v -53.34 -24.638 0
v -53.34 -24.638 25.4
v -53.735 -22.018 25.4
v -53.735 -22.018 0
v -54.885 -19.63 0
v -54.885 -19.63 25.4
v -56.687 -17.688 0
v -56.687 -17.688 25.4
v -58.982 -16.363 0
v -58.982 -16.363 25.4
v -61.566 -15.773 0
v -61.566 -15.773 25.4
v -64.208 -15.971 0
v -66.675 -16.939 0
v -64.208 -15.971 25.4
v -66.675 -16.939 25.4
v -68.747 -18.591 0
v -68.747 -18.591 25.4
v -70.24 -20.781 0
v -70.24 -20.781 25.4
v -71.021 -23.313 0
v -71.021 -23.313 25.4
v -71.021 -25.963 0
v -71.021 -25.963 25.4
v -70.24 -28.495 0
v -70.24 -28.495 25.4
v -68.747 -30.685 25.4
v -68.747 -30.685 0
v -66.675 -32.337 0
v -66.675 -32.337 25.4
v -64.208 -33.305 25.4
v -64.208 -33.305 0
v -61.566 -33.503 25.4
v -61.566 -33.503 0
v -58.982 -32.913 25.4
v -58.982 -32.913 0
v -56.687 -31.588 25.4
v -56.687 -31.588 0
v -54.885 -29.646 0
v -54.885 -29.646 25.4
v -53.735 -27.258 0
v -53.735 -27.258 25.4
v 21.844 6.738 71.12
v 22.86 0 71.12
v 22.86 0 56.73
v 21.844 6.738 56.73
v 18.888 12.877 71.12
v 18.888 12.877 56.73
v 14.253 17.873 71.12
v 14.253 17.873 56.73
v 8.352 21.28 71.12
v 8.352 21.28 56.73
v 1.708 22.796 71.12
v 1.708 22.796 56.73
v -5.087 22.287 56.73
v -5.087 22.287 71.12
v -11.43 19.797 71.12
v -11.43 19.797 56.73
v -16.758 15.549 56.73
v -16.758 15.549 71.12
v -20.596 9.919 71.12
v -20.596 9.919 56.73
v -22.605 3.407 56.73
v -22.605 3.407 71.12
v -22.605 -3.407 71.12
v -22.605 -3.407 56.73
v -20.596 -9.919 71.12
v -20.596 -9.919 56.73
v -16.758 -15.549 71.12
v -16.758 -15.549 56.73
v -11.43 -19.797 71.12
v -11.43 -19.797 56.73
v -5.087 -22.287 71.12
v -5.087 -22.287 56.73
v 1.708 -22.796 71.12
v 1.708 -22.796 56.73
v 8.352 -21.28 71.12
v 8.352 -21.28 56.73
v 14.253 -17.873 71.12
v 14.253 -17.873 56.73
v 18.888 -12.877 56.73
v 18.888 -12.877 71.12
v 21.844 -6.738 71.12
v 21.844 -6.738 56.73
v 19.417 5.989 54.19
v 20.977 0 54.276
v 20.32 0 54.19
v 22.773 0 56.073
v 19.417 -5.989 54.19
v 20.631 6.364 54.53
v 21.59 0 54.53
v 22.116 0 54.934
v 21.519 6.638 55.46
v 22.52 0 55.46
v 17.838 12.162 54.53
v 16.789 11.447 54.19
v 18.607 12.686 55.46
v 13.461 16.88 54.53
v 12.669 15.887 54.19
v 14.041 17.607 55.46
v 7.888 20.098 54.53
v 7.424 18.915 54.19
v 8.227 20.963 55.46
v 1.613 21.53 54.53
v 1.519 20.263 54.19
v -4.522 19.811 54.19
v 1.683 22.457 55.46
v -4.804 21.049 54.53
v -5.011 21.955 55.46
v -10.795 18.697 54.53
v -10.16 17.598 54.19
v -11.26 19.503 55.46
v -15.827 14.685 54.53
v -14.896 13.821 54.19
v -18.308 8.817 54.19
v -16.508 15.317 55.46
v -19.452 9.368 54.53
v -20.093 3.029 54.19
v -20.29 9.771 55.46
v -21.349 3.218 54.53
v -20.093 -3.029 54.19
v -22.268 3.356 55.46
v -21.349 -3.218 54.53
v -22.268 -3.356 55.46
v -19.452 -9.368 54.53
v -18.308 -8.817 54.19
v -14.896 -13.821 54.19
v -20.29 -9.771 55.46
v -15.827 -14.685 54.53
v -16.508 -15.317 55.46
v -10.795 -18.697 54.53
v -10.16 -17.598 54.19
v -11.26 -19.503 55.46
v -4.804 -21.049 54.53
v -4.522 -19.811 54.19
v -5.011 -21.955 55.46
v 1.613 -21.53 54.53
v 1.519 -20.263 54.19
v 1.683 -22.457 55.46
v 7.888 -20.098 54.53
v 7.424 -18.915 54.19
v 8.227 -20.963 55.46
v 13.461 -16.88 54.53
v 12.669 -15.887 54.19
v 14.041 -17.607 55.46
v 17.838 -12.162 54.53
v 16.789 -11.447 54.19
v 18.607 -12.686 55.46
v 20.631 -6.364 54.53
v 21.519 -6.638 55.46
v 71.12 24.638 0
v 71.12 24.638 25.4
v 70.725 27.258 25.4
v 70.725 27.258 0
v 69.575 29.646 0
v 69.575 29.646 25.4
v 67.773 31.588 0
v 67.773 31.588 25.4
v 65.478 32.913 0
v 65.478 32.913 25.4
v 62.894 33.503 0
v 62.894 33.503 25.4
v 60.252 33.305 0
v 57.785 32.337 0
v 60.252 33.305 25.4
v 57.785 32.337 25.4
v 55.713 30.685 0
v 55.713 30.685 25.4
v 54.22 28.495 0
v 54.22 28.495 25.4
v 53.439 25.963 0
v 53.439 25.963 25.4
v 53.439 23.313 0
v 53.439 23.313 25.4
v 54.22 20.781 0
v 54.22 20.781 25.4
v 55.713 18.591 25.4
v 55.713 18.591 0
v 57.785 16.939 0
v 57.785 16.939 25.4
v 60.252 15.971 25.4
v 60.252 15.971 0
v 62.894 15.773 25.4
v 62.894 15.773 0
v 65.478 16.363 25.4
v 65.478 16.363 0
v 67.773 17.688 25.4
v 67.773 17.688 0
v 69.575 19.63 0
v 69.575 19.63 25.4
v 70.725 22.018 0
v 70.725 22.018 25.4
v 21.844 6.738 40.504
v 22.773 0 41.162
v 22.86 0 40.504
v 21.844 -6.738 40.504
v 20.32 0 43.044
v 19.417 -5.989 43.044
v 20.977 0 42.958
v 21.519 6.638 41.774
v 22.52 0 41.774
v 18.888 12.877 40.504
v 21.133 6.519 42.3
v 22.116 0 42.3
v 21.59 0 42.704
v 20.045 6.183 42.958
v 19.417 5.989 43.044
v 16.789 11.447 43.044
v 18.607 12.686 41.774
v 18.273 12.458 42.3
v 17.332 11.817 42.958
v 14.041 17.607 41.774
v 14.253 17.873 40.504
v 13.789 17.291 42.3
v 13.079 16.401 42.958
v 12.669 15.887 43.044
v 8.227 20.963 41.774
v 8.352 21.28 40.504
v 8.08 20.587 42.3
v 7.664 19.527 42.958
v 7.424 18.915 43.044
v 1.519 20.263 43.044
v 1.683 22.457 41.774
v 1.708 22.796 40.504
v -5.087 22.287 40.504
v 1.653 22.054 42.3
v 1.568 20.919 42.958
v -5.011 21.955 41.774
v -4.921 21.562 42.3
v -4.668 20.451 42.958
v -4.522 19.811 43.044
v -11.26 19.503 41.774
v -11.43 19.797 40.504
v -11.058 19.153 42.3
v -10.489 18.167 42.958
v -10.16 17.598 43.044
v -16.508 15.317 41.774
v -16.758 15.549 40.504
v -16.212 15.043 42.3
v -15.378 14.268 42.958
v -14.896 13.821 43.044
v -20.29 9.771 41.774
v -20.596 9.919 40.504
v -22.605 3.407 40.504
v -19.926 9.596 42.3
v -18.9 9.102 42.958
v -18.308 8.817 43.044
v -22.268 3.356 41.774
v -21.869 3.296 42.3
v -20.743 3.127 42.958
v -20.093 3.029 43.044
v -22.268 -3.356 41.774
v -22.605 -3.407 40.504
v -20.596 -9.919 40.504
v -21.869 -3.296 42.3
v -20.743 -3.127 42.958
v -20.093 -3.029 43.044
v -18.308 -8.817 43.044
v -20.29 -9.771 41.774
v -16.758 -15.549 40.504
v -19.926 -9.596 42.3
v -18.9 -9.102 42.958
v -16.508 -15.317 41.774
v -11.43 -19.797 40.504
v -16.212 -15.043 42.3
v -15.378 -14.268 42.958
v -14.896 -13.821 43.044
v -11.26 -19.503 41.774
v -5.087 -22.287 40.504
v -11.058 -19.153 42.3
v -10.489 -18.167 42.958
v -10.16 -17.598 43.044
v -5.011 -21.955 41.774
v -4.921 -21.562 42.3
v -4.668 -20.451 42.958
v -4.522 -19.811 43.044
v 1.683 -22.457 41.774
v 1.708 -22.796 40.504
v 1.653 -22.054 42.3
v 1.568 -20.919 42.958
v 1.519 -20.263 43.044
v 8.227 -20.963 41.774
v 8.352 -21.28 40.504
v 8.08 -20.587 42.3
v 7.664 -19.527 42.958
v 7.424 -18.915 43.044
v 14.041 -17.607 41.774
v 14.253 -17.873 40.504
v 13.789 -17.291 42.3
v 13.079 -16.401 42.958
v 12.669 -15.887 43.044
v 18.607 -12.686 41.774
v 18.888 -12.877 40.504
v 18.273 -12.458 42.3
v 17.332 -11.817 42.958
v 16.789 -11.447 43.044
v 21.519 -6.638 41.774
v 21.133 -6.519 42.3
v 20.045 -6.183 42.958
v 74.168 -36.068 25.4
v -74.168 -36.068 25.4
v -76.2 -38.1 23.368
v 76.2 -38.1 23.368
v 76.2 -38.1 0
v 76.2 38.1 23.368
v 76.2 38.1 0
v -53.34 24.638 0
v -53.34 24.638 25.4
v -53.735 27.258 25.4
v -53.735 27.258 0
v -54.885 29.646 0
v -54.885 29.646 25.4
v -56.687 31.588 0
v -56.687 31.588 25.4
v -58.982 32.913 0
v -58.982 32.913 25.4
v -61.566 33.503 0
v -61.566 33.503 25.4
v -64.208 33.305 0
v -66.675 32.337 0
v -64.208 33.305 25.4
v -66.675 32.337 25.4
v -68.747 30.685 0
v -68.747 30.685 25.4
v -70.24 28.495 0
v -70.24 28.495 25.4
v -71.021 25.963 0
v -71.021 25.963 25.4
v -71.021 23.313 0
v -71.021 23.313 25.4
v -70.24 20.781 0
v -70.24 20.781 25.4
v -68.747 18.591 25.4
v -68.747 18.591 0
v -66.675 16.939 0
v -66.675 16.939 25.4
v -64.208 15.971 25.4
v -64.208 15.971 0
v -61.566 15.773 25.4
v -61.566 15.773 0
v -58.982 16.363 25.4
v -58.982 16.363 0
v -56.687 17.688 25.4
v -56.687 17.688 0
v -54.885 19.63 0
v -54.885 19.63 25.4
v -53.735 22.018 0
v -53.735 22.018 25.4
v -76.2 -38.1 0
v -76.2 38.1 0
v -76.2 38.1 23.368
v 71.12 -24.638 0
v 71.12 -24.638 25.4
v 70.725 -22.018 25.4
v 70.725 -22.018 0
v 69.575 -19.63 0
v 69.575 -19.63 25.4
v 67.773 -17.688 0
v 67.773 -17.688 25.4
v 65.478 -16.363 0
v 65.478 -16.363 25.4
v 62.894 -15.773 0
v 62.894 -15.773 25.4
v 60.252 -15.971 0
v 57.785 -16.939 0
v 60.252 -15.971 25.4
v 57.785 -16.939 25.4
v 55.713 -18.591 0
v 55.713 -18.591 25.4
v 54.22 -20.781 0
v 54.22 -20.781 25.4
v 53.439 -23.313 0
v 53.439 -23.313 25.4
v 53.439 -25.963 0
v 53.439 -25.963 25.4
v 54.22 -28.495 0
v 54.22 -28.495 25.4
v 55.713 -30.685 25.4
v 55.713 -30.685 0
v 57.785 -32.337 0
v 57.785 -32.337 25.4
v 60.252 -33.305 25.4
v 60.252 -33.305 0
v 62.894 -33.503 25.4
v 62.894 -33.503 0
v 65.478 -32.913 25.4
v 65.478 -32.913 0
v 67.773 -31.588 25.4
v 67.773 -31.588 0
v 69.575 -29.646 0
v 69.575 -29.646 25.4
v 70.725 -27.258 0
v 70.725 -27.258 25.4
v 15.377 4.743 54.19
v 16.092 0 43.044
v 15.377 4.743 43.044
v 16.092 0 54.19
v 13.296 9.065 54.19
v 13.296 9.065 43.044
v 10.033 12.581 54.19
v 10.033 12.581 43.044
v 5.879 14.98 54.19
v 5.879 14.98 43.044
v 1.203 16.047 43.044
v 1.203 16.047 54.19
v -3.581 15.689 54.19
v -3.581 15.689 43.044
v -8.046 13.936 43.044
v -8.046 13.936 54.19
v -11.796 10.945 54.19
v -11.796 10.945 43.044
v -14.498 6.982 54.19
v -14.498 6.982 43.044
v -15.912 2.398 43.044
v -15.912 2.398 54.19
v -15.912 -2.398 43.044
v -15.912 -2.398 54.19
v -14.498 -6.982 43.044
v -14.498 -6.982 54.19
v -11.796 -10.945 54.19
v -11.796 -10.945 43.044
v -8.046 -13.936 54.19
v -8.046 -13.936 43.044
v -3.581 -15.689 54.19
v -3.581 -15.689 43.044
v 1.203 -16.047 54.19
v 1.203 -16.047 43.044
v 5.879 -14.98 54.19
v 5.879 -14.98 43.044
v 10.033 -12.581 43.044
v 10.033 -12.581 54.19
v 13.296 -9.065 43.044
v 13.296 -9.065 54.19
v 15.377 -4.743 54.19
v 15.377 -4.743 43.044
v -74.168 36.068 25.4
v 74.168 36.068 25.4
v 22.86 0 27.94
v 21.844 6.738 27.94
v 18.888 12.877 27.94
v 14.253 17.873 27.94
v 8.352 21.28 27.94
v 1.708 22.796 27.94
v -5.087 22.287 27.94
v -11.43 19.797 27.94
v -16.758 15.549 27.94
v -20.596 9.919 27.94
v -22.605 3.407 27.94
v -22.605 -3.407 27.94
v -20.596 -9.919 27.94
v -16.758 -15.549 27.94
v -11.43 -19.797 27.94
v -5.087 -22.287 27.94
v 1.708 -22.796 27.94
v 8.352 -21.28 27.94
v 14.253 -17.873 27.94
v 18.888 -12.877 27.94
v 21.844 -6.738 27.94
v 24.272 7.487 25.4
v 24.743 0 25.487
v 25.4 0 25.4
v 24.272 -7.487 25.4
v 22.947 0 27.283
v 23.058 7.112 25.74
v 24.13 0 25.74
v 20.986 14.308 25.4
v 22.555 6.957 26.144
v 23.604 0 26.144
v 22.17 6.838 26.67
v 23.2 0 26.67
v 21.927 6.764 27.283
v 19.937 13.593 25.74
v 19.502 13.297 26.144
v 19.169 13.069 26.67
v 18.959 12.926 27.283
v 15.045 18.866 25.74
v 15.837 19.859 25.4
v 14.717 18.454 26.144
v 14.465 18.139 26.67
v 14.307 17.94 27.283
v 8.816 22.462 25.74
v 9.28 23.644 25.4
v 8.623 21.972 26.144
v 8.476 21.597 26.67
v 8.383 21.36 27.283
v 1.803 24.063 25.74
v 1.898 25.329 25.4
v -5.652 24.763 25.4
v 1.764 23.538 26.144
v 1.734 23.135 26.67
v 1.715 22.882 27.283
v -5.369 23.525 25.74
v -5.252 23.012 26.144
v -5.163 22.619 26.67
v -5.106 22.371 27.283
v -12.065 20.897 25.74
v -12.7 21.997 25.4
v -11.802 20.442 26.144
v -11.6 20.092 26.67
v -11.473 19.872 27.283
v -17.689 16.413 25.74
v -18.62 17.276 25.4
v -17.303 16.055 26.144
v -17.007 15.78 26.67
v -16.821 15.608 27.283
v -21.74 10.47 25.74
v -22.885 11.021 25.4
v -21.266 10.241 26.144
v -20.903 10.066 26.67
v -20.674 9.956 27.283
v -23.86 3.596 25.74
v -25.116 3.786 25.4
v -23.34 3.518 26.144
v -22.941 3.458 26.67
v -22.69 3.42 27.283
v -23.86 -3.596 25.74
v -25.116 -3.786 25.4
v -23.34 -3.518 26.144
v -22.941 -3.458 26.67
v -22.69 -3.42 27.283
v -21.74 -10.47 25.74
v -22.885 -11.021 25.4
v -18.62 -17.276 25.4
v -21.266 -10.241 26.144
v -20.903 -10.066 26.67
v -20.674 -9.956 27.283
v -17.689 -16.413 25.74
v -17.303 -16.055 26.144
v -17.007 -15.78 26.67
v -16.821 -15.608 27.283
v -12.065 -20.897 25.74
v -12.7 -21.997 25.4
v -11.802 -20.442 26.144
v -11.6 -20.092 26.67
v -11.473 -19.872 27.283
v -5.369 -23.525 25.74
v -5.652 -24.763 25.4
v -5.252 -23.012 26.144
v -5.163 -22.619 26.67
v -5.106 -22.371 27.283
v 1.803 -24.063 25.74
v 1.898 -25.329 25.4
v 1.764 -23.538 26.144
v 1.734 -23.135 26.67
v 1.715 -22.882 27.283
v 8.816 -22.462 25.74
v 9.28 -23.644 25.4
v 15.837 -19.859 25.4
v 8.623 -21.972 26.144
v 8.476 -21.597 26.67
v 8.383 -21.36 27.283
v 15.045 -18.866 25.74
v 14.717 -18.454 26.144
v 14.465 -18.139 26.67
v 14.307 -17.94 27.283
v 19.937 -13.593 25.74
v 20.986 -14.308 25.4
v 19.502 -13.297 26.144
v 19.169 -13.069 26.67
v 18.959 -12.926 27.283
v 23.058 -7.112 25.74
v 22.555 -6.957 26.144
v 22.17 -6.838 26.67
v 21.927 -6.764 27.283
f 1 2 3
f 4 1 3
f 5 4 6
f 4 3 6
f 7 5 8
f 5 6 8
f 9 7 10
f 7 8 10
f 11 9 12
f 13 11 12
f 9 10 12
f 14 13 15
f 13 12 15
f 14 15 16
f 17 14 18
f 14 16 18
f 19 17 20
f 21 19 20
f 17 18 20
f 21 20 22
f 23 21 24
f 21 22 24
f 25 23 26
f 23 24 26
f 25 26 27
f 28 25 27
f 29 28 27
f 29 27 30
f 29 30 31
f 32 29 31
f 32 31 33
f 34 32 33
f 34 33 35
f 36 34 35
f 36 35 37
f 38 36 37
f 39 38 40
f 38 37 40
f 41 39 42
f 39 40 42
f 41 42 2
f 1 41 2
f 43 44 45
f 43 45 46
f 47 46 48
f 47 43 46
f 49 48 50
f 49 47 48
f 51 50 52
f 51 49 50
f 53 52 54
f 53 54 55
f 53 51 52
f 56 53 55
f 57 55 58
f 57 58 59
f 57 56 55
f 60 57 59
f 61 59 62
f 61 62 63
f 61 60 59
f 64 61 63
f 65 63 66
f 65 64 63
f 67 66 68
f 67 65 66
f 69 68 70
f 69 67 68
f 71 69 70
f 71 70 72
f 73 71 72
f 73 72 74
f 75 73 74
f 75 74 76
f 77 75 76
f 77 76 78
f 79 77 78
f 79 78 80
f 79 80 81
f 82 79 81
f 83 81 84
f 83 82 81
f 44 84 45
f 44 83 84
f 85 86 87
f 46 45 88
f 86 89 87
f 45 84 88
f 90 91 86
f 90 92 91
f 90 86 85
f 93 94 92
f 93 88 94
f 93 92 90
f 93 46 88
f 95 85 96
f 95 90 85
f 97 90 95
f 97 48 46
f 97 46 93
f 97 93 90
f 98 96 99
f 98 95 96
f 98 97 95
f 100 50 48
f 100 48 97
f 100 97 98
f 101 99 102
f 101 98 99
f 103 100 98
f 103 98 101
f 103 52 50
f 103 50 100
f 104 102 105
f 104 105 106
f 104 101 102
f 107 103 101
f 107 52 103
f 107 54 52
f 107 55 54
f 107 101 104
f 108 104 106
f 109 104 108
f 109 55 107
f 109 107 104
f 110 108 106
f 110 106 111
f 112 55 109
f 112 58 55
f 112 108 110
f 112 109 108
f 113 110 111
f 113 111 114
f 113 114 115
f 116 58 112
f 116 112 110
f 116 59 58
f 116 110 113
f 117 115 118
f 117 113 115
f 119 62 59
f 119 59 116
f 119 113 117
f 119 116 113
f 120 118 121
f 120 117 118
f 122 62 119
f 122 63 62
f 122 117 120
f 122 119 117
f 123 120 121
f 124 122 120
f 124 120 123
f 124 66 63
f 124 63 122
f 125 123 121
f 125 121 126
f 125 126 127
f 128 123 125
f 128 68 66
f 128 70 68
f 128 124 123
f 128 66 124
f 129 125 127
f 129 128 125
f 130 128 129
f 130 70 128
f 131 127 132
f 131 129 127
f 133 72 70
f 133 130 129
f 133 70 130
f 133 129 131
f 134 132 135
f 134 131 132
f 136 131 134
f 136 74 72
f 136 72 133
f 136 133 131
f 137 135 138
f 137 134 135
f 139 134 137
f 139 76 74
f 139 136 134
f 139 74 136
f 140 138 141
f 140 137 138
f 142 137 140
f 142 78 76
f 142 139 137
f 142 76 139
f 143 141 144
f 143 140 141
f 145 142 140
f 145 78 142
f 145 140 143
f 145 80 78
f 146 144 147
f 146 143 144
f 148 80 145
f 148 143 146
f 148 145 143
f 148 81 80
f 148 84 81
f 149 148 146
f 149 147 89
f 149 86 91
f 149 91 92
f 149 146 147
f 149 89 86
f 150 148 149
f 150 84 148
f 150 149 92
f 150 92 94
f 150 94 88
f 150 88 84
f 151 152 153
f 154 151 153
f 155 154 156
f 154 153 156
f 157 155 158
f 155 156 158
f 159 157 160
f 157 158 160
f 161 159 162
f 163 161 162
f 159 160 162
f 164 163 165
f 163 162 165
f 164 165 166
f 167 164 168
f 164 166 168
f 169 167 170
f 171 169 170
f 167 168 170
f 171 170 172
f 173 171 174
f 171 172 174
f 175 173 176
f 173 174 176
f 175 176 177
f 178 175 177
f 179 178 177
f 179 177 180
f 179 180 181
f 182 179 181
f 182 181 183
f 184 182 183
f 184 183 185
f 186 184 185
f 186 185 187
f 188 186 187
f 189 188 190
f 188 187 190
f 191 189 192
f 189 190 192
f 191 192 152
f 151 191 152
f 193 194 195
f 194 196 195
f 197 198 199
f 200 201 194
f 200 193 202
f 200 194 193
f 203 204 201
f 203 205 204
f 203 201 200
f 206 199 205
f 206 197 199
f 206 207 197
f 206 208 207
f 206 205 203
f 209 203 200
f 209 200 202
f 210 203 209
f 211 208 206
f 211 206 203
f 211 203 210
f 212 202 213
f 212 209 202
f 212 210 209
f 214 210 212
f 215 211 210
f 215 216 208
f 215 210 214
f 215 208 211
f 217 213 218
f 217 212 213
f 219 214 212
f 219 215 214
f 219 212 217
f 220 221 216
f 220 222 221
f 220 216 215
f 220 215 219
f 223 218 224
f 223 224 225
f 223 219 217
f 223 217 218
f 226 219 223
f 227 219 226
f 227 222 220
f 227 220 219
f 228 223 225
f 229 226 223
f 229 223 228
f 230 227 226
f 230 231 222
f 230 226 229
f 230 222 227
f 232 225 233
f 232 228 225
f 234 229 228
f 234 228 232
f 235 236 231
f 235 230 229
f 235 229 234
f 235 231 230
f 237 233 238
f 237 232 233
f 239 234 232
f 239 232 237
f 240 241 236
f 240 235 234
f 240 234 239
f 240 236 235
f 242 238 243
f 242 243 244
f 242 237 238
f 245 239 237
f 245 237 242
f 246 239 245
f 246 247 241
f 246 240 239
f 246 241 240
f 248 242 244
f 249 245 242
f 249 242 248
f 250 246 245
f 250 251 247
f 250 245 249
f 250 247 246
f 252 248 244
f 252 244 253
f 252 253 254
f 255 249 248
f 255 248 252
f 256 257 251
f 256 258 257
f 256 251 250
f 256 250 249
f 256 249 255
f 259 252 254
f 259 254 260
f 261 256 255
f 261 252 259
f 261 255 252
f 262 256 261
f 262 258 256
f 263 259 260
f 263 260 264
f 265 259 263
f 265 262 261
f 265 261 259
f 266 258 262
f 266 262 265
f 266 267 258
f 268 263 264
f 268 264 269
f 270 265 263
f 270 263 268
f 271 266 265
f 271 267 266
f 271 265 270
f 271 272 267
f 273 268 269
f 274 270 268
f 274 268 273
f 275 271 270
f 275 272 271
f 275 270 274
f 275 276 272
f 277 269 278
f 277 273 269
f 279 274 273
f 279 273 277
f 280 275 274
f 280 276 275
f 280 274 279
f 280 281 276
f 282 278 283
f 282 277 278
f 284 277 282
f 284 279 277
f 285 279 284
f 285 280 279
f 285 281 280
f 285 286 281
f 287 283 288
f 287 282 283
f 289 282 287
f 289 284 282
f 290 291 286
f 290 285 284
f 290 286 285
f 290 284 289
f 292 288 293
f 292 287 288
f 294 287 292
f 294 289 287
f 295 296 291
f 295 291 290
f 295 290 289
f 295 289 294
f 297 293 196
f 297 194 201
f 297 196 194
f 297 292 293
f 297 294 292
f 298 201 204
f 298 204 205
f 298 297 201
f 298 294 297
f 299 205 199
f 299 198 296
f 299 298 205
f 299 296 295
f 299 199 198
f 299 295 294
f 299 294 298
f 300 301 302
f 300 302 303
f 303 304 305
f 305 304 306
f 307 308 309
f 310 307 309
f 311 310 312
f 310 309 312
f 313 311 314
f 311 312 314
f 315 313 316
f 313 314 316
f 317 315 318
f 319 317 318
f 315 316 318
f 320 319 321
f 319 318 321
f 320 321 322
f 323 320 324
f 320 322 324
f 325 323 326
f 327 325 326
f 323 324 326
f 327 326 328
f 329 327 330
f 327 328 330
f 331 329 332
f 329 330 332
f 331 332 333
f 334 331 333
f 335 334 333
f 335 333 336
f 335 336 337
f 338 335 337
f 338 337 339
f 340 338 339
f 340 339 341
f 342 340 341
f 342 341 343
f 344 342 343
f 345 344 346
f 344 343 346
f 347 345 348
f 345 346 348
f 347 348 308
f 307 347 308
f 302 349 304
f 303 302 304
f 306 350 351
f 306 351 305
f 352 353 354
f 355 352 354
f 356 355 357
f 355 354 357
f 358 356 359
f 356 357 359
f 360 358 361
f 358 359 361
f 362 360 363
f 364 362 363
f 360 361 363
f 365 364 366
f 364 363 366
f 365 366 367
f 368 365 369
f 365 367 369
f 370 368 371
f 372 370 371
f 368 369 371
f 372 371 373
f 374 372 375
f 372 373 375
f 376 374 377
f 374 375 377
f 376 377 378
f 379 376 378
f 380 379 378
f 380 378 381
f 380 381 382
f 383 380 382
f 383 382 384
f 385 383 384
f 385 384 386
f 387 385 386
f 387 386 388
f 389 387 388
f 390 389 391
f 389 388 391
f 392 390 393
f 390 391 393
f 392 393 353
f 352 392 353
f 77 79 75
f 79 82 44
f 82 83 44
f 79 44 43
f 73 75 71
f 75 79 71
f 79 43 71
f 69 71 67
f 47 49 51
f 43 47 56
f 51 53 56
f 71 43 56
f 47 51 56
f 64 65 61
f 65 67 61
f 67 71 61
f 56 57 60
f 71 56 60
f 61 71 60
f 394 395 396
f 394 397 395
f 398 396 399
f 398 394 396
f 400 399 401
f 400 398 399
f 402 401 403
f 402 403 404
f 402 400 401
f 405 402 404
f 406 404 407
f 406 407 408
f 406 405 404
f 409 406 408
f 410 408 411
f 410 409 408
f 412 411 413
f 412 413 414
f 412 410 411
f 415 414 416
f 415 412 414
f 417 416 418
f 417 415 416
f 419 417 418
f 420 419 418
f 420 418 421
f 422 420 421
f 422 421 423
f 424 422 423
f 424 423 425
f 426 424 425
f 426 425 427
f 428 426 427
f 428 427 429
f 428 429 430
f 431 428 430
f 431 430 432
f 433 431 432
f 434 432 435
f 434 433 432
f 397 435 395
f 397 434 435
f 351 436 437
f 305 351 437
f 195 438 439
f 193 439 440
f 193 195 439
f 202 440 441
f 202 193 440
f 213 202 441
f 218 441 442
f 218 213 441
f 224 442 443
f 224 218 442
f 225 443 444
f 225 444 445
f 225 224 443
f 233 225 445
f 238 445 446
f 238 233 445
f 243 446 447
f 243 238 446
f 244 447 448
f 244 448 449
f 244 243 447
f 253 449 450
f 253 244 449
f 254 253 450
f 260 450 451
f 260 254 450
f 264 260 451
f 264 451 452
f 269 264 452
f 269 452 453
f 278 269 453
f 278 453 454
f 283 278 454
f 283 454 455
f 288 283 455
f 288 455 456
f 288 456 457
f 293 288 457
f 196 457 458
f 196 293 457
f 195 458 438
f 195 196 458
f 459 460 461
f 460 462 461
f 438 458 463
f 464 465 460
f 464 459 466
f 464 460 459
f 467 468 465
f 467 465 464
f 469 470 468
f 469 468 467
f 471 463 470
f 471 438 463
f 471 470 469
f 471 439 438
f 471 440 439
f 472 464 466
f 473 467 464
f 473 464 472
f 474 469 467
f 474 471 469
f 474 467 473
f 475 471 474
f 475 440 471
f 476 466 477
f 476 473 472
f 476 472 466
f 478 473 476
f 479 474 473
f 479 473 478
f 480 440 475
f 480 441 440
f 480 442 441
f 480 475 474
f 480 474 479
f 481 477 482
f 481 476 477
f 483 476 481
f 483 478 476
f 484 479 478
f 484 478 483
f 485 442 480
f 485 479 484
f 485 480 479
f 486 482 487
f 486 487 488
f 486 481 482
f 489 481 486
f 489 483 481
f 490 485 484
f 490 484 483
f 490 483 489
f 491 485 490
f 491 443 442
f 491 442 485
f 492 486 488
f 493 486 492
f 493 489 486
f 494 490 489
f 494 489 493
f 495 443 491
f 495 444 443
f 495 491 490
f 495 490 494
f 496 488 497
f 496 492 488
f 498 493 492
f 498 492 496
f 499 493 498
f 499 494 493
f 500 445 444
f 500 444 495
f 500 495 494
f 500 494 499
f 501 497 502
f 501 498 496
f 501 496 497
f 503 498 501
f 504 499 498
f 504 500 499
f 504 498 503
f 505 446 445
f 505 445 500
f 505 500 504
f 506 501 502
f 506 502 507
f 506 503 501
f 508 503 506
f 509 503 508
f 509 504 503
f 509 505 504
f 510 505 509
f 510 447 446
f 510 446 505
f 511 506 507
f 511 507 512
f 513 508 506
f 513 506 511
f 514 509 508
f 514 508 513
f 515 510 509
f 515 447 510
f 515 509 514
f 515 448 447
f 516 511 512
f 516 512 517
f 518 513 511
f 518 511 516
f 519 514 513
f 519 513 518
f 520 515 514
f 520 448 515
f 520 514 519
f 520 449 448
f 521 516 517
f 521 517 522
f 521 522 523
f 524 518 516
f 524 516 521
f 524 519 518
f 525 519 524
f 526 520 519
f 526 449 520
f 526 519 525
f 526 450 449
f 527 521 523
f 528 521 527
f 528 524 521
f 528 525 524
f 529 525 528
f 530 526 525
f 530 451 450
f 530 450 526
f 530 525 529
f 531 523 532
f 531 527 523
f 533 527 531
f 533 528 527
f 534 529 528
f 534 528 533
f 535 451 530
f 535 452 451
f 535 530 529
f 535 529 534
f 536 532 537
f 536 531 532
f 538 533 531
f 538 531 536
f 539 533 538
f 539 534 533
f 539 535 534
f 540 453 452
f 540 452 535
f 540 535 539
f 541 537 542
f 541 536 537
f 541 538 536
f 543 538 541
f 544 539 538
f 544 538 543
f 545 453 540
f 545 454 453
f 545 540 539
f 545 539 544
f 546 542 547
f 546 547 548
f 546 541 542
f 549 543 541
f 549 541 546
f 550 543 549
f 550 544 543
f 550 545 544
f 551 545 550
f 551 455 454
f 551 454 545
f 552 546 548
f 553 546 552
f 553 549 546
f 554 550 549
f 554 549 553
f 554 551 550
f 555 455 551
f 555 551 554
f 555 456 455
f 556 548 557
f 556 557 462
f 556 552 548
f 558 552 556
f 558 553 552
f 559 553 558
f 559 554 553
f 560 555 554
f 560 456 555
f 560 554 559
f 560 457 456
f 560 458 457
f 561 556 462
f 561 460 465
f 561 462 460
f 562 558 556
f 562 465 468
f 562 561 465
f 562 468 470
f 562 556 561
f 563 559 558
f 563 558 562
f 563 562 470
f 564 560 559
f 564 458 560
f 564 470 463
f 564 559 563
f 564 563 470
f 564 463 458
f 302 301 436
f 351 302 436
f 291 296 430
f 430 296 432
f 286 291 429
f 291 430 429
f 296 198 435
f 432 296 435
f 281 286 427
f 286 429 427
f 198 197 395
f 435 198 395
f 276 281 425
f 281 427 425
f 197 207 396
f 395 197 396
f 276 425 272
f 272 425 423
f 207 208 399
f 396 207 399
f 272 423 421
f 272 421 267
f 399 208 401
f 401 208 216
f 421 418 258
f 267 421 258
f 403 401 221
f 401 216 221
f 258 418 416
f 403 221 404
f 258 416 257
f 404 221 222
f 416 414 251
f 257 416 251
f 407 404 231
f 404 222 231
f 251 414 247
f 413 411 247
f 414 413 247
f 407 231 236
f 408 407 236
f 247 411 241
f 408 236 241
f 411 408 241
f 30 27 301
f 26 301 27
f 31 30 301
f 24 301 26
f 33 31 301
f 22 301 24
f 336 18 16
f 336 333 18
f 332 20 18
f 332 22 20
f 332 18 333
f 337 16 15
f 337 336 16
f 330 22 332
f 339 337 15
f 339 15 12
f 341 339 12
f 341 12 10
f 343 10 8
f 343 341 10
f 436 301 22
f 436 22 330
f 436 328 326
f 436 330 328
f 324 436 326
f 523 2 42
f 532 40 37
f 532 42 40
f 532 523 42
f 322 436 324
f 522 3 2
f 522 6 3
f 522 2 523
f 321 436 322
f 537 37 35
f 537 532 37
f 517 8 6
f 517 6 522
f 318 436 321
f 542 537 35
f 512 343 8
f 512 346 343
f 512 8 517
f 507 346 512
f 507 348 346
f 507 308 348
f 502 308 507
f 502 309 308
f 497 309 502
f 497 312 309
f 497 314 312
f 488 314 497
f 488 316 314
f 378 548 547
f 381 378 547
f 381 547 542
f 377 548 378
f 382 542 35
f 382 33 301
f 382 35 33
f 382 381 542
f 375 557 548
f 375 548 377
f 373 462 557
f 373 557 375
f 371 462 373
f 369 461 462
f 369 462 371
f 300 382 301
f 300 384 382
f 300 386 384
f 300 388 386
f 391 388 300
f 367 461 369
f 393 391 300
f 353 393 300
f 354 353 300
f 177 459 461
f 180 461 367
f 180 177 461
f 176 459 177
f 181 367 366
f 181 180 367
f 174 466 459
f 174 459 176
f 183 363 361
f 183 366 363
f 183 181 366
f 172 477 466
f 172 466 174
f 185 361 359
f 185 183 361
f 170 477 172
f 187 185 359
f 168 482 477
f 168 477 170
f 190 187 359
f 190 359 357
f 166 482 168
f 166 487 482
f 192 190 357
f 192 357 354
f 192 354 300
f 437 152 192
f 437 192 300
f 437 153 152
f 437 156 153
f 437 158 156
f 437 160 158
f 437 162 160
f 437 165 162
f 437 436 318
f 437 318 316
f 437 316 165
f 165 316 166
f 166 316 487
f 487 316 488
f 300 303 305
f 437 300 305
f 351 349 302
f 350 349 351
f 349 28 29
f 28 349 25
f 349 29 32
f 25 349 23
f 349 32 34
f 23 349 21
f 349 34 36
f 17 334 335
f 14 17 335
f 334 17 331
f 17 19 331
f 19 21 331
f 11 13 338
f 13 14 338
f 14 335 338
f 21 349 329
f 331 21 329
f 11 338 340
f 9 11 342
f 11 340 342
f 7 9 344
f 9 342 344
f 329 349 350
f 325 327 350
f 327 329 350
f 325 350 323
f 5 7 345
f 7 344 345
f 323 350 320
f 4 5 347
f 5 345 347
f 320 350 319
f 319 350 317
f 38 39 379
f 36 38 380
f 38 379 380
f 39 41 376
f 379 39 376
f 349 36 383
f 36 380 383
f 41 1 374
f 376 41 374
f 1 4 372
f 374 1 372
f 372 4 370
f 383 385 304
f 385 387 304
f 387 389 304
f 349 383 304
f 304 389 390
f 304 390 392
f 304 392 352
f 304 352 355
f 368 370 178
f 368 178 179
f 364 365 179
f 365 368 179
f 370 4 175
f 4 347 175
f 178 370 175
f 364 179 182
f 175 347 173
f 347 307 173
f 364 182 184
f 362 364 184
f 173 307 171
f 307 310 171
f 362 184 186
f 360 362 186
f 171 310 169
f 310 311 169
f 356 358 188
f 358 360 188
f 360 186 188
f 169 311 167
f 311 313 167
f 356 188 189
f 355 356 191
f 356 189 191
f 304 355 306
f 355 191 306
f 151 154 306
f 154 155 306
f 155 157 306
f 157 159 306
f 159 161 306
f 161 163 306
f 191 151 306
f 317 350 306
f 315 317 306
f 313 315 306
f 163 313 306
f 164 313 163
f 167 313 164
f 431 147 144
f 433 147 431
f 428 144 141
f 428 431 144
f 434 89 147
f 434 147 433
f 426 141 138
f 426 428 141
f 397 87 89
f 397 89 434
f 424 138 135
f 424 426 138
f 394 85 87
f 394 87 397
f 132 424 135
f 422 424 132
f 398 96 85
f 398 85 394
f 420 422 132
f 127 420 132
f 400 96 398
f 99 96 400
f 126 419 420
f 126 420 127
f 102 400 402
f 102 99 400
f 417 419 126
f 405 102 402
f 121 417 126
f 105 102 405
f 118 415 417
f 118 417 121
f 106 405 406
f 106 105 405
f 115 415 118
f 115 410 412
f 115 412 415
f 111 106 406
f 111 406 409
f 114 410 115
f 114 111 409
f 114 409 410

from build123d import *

# Parameters (mm, degrees)
F0_W     = 152.4
F0_H     = 76.2
F1_DEPTH = 25.4
F2_R     = 8.89
F3_DEPTH = 25.4
F4_SIZE  = 2.032
F5_W     = 22.86
F5_H     = 45.72
F7_W     = 6.9182990119
F7_H     = 11.1455507576
F9_R     = 2.54
F10_R    = 2.54


with BuildPart() as f1:
    # F0 (on Top) → F1 (new body)
    with BuildSketch(Plane.XY):
        Rectangle(F0_W, F0_H)
    extrude(amount=F1_DEPTH)

    # F2 (on face) → F3 (cut)
    with BuildSketch(Plane.XY.offset(25.4)):
        with Locations((-62.23, 24.638)):
            Circle(F2_R)
        with Locations((62.23, -24.638)):
            Circle(F2_R)
        with Locations((62.23, 24.638)):
            Circle(F2_R)
        with Locations((-62.23, -24.638)):
            Circle(F2_R)
    extrude(amount=-F3_DEPTH, mode=Mode.SUBTRACT)

    # F4
    f4_edges = [f1.edges().sort_by_distance(p)[0] for p in [
        (76.2, 0, 25.4),
        (0, 38.1, 25.4),
        (0, -38.1, 25.4),
        (-76.2, 0, 25.4),
    ]]
    chamfer(f4_edges, length=F4_SIZE)

    # F5 (on Front) → F6 (revolve)
    with BuildSketch(Plane.XZ):
        with Locations((11.43, 48.26)):
            Rectangle(F5_W, F5_H)
    revolve(axis=Axis((0, 0, 48.26), (0, 0, 1)))

    # F7 (on Front) → F8 (revolve, cut)
    with BuildSketch(Plane.XZ):
        with Locations((19.5512440987, 48.6171673983)):
            Rectangle(F7_W, F7_H)
    revolve(axis=Axis((0, 0, 25.4), (0, 0, 1)), mode=Mode.SUBTRACT)

    # F9
    f9_edges = [f1.edges().sort_by_distance(p)[0] for p in [
        (22.86, 0, 34.222196),
        (-22.86, 0, 43.044392),
        (-22.86, 0, 25.4),
    ]]
    fillet(f9_edges, radius=F9_R)

    # F10
    f10_edges = [f1.edges().sort_by_distance(p)[0] for p in [
        (-22.86, 0, 54.189943),
    ]]
    fillet(f10_edges, radius=F10_R)


solid = f1.part
